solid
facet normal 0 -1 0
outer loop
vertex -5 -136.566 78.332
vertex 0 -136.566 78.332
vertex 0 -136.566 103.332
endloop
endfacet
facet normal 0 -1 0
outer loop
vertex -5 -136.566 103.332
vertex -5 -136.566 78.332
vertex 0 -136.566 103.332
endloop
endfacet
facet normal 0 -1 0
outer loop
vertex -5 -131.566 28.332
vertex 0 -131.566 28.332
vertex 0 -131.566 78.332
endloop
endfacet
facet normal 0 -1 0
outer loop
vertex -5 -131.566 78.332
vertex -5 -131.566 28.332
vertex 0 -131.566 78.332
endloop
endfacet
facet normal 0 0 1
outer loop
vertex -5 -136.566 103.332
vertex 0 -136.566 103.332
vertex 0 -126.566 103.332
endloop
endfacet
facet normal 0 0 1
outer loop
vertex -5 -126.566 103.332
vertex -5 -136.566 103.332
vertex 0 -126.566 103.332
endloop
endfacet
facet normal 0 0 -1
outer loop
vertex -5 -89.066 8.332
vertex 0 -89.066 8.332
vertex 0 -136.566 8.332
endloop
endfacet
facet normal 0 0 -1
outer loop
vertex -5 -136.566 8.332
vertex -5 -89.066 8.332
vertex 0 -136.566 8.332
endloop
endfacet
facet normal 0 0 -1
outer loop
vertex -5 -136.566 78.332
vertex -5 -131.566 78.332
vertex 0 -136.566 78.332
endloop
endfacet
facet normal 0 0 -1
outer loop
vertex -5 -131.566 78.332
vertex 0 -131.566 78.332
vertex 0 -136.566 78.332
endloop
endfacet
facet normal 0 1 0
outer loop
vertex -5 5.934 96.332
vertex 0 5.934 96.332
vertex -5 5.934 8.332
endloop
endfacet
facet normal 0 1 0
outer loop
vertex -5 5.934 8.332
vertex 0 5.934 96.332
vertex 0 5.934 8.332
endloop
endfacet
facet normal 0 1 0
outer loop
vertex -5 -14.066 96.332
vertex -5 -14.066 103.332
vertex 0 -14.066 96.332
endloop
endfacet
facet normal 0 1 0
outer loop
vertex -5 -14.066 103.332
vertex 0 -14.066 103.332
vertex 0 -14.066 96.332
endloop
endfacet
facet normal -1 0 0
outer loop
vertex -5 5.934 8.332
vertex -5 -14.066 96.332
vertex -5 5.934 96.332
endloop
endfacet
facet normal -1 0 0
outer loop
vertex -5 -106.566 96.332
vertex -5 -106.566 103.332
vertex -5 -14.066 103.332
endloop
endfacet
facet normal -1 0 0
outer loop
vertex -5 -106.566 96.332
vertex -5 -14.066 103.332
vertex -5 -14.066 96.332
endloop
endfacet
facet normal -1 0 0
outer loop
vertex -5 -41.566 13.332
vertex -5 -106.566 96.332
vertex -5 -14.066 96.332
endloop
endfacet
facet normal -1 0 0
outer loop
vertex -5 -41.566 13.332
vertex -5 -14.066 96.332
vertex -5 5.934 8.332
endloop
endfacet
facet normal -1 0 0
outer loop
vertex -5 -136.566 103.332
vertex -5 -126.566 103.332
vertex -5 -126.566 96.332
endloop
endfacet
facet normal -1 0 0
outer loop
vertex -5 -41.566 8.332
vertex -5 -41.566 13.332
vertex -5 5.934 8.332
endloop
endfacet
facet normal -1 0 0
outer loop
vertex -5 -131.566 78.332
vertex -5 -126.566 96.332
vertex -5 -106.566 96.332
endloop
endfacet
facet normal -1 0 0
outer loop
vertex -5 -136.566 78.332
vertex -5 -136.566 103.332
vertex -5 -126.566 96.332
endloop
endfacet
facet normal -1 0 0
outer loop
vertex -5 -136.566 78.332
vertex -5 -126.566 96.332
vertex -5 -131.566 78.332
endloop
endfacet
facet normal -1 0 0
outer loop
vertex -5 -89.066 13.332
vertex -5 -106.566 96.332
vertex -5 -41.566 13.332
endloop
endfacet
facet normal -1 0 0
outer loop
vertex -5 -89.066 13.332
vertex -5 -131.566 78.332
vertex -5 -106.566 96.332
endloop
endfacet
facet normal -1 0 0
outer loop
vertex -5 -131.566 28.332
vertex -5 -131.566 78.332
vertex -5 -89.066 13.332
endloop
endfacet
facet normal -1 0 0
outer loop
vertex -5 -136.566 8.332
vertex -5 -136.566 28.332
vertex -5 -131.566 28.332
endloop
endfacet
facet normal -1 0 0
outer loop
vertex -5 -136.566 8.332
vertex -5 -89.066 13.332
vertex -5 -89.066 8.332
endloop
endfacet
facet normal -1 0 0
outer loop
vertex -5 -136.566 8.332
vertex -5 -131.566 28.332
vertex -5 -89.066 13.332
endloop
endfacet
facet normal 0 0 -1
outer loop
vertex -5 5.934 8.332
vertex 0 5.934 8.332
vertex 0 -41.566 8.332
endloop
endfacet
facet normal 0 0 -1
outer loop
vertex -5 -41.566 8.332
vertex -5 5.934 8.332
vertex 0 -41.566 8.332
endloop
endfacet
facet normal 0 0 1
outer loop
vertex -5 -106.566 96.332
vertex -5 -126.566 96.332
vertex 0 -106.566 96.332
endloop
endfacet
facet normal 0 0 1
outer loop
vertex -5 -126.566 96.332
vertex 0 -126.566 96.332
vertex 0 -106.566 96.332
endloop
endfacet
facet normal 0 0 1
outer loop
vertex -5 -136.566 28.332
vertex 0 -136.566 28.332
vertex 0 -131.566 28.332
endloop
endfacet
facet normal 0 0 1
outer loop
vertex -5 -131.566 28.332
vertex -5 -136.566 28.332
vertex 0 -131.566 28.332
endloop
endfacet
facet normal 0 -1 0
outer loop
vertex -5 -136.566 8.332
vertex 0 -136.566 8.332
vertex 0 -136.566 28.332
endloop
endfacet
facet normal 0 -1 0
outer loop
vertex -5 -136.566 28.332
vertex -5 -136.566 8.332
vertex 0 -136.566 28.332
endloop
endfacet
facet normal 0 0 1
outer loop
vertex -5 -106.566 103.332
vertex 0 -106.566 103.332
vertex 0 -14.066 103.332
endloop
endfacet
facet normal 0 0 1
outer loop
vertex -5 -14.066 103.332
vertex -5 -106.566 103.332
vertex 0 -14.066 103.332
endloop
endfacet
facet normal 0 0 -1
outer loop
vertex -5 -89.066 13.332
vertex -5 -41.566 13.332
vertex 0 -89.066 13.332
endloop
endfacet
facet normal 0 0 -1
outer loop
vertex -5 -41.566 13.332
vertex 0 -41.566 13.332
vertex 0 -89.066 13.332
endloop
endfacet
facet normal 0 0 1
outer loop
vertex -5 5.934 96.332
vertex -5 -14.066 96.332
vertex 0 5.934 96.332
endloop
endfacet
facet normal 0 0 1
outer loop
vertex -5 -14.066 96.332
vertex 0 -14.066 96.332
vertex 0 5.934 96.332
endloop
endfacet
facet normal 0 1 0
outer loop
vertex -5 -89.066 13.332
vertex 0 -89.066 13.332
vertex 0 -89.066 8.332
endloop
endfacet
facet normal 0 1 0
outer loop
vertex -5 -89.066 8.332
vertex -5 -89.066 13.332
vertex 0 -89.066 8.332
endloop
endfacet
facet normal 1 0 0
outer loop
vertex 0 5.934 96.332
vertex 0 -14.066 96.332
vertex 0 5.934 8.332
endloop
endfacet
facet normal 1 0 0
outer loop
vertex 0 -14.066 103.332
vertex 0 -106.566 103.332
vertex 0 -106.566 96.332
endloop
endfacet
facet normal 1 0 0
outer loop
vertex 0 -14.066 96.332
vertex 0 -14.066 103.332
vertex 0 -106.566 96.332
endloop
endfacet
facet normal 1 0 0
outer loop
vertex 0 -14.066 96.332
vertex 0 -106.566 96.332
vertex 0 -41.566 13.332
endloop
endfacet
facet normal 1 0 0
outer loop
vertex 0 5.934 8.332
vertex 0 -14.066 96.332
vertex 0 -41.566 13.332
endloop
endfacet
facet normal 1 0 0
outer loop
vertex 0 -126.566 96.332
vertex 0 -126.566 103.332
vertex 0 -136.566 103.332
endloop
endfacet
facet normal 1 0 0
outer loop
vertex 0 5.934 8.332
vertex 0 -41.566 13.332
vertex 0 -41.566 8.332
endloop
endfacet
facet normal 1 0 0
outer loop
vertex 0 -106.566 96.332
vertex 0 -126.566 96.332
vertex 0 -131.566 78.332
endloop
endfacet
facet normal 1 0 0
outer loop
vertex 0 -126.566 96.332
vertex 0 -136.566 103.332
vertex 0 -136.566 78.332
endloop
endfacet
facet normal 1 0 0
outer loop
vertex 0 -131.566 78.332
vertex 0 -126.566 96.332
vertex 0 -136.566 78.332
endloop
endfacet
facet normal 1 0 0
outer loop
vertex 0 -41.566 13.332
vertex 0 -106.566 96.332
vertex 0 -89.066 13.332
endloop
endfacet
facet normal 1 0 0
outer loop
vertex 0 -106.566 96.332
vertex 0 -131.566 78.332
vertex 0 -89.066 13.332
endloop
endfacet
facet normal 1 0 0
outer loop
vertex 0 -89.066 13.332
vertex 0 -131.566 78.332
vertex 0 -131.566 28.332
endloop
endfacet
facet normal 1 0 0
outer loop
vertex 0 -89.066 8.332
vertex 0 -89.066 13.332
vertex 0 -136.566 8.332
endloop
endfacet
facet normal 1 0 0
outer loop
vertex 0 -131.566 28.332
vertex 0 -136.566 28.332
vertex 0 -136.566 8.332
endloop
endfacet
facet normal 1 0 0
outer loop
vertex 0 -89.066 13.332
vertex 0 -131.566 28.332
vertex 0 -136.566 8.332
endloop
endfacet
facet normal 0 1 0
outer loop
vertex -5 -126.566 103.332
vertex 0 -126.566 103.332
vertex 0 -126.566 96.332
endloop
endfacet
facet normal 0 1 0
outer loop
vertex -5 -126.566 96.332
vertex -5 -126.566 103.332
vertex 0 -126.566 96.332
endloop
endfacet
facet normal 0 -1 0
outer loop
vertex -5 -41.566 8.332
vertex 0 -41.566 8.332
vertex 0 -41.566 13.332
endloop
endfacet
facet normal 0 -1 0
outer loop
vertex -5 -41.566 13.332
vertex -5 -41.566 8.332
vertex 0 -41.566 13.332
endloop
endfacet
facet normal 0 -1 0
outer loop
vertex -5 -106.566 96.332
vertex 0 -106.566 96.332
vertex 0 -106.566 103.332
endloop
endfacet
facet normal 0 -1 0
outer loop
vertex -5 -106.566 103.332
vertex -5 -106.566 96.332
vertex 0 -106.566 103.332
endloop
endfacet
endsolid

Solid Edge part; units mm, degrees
sketch "Sketch1" plane through (0, 0, 0) normal (1, 0, 0) x (0, 1, 0)
  line L0 (-136.5657, 103.3324) -> (-126.5657, 103.3324)
  line L1 (-126.5657, 103.3324) -> (-126.5657, 96.3324)
  line L2 (-126.5657, 96.3324) -> (-106.5657, 96.3324)
  line L3 (-106.5657, 96.3324) -> (-106.5657, 103.3324)
  line L4 (-106.5657, 103.3324) -> (-14.0657, 103.3324)
  line L5 (-14.0657, 103.3324) -> (-14.0657, 96.3324)
  line L6 (-14.0657, 96.3324) -> (5.9343, 96.3324)
  line L7 (5.9343, 96.3324) -> (5.9343, 8.3324)
  line L8 (5.9343, 8.3324) -> (-41.5657, 8.3324)
  line L9 (-41.5657, 8.3324) -> (-41.5657, 13.3324)
  line L10 (-41.5657, 13.3324) -> (-89.0657, 13.3324)
  line L11 (-89.0657, 13.3324) -> (-89.0657, 8.3324)
  line L12 (-89.0657, 8.3324) -> (-136.5657, 8.3324)
  line L13 (-136.5657, 8.3324) -> (-136.5657, 28.3324)
  line L14 (-136.5657, 28.3324) -> (-131.5657, 28.3324)
  line L15 (-131.5657, 28.3324) -> (-131.5657, 78.3324)
  line L16 (-131.5657, 78.3324) -> (-136.5657, 78.3324)
  line L17 (-136.5657, 78.3324) -> (-136.5657, 103.3324)
  dimension "D1" = 7
  dimension "D2" = 20
  dimension "D3" = 92.5
  dimension "D4" = 10
  dimension "D5" = 5
  dimension "D6" = 25
  dimension "D7" = 50
  dimension "D8" = 95
extrude "Protrusion1" add sketch "Sketch1" against normal blind 5
properties material "Acier"
